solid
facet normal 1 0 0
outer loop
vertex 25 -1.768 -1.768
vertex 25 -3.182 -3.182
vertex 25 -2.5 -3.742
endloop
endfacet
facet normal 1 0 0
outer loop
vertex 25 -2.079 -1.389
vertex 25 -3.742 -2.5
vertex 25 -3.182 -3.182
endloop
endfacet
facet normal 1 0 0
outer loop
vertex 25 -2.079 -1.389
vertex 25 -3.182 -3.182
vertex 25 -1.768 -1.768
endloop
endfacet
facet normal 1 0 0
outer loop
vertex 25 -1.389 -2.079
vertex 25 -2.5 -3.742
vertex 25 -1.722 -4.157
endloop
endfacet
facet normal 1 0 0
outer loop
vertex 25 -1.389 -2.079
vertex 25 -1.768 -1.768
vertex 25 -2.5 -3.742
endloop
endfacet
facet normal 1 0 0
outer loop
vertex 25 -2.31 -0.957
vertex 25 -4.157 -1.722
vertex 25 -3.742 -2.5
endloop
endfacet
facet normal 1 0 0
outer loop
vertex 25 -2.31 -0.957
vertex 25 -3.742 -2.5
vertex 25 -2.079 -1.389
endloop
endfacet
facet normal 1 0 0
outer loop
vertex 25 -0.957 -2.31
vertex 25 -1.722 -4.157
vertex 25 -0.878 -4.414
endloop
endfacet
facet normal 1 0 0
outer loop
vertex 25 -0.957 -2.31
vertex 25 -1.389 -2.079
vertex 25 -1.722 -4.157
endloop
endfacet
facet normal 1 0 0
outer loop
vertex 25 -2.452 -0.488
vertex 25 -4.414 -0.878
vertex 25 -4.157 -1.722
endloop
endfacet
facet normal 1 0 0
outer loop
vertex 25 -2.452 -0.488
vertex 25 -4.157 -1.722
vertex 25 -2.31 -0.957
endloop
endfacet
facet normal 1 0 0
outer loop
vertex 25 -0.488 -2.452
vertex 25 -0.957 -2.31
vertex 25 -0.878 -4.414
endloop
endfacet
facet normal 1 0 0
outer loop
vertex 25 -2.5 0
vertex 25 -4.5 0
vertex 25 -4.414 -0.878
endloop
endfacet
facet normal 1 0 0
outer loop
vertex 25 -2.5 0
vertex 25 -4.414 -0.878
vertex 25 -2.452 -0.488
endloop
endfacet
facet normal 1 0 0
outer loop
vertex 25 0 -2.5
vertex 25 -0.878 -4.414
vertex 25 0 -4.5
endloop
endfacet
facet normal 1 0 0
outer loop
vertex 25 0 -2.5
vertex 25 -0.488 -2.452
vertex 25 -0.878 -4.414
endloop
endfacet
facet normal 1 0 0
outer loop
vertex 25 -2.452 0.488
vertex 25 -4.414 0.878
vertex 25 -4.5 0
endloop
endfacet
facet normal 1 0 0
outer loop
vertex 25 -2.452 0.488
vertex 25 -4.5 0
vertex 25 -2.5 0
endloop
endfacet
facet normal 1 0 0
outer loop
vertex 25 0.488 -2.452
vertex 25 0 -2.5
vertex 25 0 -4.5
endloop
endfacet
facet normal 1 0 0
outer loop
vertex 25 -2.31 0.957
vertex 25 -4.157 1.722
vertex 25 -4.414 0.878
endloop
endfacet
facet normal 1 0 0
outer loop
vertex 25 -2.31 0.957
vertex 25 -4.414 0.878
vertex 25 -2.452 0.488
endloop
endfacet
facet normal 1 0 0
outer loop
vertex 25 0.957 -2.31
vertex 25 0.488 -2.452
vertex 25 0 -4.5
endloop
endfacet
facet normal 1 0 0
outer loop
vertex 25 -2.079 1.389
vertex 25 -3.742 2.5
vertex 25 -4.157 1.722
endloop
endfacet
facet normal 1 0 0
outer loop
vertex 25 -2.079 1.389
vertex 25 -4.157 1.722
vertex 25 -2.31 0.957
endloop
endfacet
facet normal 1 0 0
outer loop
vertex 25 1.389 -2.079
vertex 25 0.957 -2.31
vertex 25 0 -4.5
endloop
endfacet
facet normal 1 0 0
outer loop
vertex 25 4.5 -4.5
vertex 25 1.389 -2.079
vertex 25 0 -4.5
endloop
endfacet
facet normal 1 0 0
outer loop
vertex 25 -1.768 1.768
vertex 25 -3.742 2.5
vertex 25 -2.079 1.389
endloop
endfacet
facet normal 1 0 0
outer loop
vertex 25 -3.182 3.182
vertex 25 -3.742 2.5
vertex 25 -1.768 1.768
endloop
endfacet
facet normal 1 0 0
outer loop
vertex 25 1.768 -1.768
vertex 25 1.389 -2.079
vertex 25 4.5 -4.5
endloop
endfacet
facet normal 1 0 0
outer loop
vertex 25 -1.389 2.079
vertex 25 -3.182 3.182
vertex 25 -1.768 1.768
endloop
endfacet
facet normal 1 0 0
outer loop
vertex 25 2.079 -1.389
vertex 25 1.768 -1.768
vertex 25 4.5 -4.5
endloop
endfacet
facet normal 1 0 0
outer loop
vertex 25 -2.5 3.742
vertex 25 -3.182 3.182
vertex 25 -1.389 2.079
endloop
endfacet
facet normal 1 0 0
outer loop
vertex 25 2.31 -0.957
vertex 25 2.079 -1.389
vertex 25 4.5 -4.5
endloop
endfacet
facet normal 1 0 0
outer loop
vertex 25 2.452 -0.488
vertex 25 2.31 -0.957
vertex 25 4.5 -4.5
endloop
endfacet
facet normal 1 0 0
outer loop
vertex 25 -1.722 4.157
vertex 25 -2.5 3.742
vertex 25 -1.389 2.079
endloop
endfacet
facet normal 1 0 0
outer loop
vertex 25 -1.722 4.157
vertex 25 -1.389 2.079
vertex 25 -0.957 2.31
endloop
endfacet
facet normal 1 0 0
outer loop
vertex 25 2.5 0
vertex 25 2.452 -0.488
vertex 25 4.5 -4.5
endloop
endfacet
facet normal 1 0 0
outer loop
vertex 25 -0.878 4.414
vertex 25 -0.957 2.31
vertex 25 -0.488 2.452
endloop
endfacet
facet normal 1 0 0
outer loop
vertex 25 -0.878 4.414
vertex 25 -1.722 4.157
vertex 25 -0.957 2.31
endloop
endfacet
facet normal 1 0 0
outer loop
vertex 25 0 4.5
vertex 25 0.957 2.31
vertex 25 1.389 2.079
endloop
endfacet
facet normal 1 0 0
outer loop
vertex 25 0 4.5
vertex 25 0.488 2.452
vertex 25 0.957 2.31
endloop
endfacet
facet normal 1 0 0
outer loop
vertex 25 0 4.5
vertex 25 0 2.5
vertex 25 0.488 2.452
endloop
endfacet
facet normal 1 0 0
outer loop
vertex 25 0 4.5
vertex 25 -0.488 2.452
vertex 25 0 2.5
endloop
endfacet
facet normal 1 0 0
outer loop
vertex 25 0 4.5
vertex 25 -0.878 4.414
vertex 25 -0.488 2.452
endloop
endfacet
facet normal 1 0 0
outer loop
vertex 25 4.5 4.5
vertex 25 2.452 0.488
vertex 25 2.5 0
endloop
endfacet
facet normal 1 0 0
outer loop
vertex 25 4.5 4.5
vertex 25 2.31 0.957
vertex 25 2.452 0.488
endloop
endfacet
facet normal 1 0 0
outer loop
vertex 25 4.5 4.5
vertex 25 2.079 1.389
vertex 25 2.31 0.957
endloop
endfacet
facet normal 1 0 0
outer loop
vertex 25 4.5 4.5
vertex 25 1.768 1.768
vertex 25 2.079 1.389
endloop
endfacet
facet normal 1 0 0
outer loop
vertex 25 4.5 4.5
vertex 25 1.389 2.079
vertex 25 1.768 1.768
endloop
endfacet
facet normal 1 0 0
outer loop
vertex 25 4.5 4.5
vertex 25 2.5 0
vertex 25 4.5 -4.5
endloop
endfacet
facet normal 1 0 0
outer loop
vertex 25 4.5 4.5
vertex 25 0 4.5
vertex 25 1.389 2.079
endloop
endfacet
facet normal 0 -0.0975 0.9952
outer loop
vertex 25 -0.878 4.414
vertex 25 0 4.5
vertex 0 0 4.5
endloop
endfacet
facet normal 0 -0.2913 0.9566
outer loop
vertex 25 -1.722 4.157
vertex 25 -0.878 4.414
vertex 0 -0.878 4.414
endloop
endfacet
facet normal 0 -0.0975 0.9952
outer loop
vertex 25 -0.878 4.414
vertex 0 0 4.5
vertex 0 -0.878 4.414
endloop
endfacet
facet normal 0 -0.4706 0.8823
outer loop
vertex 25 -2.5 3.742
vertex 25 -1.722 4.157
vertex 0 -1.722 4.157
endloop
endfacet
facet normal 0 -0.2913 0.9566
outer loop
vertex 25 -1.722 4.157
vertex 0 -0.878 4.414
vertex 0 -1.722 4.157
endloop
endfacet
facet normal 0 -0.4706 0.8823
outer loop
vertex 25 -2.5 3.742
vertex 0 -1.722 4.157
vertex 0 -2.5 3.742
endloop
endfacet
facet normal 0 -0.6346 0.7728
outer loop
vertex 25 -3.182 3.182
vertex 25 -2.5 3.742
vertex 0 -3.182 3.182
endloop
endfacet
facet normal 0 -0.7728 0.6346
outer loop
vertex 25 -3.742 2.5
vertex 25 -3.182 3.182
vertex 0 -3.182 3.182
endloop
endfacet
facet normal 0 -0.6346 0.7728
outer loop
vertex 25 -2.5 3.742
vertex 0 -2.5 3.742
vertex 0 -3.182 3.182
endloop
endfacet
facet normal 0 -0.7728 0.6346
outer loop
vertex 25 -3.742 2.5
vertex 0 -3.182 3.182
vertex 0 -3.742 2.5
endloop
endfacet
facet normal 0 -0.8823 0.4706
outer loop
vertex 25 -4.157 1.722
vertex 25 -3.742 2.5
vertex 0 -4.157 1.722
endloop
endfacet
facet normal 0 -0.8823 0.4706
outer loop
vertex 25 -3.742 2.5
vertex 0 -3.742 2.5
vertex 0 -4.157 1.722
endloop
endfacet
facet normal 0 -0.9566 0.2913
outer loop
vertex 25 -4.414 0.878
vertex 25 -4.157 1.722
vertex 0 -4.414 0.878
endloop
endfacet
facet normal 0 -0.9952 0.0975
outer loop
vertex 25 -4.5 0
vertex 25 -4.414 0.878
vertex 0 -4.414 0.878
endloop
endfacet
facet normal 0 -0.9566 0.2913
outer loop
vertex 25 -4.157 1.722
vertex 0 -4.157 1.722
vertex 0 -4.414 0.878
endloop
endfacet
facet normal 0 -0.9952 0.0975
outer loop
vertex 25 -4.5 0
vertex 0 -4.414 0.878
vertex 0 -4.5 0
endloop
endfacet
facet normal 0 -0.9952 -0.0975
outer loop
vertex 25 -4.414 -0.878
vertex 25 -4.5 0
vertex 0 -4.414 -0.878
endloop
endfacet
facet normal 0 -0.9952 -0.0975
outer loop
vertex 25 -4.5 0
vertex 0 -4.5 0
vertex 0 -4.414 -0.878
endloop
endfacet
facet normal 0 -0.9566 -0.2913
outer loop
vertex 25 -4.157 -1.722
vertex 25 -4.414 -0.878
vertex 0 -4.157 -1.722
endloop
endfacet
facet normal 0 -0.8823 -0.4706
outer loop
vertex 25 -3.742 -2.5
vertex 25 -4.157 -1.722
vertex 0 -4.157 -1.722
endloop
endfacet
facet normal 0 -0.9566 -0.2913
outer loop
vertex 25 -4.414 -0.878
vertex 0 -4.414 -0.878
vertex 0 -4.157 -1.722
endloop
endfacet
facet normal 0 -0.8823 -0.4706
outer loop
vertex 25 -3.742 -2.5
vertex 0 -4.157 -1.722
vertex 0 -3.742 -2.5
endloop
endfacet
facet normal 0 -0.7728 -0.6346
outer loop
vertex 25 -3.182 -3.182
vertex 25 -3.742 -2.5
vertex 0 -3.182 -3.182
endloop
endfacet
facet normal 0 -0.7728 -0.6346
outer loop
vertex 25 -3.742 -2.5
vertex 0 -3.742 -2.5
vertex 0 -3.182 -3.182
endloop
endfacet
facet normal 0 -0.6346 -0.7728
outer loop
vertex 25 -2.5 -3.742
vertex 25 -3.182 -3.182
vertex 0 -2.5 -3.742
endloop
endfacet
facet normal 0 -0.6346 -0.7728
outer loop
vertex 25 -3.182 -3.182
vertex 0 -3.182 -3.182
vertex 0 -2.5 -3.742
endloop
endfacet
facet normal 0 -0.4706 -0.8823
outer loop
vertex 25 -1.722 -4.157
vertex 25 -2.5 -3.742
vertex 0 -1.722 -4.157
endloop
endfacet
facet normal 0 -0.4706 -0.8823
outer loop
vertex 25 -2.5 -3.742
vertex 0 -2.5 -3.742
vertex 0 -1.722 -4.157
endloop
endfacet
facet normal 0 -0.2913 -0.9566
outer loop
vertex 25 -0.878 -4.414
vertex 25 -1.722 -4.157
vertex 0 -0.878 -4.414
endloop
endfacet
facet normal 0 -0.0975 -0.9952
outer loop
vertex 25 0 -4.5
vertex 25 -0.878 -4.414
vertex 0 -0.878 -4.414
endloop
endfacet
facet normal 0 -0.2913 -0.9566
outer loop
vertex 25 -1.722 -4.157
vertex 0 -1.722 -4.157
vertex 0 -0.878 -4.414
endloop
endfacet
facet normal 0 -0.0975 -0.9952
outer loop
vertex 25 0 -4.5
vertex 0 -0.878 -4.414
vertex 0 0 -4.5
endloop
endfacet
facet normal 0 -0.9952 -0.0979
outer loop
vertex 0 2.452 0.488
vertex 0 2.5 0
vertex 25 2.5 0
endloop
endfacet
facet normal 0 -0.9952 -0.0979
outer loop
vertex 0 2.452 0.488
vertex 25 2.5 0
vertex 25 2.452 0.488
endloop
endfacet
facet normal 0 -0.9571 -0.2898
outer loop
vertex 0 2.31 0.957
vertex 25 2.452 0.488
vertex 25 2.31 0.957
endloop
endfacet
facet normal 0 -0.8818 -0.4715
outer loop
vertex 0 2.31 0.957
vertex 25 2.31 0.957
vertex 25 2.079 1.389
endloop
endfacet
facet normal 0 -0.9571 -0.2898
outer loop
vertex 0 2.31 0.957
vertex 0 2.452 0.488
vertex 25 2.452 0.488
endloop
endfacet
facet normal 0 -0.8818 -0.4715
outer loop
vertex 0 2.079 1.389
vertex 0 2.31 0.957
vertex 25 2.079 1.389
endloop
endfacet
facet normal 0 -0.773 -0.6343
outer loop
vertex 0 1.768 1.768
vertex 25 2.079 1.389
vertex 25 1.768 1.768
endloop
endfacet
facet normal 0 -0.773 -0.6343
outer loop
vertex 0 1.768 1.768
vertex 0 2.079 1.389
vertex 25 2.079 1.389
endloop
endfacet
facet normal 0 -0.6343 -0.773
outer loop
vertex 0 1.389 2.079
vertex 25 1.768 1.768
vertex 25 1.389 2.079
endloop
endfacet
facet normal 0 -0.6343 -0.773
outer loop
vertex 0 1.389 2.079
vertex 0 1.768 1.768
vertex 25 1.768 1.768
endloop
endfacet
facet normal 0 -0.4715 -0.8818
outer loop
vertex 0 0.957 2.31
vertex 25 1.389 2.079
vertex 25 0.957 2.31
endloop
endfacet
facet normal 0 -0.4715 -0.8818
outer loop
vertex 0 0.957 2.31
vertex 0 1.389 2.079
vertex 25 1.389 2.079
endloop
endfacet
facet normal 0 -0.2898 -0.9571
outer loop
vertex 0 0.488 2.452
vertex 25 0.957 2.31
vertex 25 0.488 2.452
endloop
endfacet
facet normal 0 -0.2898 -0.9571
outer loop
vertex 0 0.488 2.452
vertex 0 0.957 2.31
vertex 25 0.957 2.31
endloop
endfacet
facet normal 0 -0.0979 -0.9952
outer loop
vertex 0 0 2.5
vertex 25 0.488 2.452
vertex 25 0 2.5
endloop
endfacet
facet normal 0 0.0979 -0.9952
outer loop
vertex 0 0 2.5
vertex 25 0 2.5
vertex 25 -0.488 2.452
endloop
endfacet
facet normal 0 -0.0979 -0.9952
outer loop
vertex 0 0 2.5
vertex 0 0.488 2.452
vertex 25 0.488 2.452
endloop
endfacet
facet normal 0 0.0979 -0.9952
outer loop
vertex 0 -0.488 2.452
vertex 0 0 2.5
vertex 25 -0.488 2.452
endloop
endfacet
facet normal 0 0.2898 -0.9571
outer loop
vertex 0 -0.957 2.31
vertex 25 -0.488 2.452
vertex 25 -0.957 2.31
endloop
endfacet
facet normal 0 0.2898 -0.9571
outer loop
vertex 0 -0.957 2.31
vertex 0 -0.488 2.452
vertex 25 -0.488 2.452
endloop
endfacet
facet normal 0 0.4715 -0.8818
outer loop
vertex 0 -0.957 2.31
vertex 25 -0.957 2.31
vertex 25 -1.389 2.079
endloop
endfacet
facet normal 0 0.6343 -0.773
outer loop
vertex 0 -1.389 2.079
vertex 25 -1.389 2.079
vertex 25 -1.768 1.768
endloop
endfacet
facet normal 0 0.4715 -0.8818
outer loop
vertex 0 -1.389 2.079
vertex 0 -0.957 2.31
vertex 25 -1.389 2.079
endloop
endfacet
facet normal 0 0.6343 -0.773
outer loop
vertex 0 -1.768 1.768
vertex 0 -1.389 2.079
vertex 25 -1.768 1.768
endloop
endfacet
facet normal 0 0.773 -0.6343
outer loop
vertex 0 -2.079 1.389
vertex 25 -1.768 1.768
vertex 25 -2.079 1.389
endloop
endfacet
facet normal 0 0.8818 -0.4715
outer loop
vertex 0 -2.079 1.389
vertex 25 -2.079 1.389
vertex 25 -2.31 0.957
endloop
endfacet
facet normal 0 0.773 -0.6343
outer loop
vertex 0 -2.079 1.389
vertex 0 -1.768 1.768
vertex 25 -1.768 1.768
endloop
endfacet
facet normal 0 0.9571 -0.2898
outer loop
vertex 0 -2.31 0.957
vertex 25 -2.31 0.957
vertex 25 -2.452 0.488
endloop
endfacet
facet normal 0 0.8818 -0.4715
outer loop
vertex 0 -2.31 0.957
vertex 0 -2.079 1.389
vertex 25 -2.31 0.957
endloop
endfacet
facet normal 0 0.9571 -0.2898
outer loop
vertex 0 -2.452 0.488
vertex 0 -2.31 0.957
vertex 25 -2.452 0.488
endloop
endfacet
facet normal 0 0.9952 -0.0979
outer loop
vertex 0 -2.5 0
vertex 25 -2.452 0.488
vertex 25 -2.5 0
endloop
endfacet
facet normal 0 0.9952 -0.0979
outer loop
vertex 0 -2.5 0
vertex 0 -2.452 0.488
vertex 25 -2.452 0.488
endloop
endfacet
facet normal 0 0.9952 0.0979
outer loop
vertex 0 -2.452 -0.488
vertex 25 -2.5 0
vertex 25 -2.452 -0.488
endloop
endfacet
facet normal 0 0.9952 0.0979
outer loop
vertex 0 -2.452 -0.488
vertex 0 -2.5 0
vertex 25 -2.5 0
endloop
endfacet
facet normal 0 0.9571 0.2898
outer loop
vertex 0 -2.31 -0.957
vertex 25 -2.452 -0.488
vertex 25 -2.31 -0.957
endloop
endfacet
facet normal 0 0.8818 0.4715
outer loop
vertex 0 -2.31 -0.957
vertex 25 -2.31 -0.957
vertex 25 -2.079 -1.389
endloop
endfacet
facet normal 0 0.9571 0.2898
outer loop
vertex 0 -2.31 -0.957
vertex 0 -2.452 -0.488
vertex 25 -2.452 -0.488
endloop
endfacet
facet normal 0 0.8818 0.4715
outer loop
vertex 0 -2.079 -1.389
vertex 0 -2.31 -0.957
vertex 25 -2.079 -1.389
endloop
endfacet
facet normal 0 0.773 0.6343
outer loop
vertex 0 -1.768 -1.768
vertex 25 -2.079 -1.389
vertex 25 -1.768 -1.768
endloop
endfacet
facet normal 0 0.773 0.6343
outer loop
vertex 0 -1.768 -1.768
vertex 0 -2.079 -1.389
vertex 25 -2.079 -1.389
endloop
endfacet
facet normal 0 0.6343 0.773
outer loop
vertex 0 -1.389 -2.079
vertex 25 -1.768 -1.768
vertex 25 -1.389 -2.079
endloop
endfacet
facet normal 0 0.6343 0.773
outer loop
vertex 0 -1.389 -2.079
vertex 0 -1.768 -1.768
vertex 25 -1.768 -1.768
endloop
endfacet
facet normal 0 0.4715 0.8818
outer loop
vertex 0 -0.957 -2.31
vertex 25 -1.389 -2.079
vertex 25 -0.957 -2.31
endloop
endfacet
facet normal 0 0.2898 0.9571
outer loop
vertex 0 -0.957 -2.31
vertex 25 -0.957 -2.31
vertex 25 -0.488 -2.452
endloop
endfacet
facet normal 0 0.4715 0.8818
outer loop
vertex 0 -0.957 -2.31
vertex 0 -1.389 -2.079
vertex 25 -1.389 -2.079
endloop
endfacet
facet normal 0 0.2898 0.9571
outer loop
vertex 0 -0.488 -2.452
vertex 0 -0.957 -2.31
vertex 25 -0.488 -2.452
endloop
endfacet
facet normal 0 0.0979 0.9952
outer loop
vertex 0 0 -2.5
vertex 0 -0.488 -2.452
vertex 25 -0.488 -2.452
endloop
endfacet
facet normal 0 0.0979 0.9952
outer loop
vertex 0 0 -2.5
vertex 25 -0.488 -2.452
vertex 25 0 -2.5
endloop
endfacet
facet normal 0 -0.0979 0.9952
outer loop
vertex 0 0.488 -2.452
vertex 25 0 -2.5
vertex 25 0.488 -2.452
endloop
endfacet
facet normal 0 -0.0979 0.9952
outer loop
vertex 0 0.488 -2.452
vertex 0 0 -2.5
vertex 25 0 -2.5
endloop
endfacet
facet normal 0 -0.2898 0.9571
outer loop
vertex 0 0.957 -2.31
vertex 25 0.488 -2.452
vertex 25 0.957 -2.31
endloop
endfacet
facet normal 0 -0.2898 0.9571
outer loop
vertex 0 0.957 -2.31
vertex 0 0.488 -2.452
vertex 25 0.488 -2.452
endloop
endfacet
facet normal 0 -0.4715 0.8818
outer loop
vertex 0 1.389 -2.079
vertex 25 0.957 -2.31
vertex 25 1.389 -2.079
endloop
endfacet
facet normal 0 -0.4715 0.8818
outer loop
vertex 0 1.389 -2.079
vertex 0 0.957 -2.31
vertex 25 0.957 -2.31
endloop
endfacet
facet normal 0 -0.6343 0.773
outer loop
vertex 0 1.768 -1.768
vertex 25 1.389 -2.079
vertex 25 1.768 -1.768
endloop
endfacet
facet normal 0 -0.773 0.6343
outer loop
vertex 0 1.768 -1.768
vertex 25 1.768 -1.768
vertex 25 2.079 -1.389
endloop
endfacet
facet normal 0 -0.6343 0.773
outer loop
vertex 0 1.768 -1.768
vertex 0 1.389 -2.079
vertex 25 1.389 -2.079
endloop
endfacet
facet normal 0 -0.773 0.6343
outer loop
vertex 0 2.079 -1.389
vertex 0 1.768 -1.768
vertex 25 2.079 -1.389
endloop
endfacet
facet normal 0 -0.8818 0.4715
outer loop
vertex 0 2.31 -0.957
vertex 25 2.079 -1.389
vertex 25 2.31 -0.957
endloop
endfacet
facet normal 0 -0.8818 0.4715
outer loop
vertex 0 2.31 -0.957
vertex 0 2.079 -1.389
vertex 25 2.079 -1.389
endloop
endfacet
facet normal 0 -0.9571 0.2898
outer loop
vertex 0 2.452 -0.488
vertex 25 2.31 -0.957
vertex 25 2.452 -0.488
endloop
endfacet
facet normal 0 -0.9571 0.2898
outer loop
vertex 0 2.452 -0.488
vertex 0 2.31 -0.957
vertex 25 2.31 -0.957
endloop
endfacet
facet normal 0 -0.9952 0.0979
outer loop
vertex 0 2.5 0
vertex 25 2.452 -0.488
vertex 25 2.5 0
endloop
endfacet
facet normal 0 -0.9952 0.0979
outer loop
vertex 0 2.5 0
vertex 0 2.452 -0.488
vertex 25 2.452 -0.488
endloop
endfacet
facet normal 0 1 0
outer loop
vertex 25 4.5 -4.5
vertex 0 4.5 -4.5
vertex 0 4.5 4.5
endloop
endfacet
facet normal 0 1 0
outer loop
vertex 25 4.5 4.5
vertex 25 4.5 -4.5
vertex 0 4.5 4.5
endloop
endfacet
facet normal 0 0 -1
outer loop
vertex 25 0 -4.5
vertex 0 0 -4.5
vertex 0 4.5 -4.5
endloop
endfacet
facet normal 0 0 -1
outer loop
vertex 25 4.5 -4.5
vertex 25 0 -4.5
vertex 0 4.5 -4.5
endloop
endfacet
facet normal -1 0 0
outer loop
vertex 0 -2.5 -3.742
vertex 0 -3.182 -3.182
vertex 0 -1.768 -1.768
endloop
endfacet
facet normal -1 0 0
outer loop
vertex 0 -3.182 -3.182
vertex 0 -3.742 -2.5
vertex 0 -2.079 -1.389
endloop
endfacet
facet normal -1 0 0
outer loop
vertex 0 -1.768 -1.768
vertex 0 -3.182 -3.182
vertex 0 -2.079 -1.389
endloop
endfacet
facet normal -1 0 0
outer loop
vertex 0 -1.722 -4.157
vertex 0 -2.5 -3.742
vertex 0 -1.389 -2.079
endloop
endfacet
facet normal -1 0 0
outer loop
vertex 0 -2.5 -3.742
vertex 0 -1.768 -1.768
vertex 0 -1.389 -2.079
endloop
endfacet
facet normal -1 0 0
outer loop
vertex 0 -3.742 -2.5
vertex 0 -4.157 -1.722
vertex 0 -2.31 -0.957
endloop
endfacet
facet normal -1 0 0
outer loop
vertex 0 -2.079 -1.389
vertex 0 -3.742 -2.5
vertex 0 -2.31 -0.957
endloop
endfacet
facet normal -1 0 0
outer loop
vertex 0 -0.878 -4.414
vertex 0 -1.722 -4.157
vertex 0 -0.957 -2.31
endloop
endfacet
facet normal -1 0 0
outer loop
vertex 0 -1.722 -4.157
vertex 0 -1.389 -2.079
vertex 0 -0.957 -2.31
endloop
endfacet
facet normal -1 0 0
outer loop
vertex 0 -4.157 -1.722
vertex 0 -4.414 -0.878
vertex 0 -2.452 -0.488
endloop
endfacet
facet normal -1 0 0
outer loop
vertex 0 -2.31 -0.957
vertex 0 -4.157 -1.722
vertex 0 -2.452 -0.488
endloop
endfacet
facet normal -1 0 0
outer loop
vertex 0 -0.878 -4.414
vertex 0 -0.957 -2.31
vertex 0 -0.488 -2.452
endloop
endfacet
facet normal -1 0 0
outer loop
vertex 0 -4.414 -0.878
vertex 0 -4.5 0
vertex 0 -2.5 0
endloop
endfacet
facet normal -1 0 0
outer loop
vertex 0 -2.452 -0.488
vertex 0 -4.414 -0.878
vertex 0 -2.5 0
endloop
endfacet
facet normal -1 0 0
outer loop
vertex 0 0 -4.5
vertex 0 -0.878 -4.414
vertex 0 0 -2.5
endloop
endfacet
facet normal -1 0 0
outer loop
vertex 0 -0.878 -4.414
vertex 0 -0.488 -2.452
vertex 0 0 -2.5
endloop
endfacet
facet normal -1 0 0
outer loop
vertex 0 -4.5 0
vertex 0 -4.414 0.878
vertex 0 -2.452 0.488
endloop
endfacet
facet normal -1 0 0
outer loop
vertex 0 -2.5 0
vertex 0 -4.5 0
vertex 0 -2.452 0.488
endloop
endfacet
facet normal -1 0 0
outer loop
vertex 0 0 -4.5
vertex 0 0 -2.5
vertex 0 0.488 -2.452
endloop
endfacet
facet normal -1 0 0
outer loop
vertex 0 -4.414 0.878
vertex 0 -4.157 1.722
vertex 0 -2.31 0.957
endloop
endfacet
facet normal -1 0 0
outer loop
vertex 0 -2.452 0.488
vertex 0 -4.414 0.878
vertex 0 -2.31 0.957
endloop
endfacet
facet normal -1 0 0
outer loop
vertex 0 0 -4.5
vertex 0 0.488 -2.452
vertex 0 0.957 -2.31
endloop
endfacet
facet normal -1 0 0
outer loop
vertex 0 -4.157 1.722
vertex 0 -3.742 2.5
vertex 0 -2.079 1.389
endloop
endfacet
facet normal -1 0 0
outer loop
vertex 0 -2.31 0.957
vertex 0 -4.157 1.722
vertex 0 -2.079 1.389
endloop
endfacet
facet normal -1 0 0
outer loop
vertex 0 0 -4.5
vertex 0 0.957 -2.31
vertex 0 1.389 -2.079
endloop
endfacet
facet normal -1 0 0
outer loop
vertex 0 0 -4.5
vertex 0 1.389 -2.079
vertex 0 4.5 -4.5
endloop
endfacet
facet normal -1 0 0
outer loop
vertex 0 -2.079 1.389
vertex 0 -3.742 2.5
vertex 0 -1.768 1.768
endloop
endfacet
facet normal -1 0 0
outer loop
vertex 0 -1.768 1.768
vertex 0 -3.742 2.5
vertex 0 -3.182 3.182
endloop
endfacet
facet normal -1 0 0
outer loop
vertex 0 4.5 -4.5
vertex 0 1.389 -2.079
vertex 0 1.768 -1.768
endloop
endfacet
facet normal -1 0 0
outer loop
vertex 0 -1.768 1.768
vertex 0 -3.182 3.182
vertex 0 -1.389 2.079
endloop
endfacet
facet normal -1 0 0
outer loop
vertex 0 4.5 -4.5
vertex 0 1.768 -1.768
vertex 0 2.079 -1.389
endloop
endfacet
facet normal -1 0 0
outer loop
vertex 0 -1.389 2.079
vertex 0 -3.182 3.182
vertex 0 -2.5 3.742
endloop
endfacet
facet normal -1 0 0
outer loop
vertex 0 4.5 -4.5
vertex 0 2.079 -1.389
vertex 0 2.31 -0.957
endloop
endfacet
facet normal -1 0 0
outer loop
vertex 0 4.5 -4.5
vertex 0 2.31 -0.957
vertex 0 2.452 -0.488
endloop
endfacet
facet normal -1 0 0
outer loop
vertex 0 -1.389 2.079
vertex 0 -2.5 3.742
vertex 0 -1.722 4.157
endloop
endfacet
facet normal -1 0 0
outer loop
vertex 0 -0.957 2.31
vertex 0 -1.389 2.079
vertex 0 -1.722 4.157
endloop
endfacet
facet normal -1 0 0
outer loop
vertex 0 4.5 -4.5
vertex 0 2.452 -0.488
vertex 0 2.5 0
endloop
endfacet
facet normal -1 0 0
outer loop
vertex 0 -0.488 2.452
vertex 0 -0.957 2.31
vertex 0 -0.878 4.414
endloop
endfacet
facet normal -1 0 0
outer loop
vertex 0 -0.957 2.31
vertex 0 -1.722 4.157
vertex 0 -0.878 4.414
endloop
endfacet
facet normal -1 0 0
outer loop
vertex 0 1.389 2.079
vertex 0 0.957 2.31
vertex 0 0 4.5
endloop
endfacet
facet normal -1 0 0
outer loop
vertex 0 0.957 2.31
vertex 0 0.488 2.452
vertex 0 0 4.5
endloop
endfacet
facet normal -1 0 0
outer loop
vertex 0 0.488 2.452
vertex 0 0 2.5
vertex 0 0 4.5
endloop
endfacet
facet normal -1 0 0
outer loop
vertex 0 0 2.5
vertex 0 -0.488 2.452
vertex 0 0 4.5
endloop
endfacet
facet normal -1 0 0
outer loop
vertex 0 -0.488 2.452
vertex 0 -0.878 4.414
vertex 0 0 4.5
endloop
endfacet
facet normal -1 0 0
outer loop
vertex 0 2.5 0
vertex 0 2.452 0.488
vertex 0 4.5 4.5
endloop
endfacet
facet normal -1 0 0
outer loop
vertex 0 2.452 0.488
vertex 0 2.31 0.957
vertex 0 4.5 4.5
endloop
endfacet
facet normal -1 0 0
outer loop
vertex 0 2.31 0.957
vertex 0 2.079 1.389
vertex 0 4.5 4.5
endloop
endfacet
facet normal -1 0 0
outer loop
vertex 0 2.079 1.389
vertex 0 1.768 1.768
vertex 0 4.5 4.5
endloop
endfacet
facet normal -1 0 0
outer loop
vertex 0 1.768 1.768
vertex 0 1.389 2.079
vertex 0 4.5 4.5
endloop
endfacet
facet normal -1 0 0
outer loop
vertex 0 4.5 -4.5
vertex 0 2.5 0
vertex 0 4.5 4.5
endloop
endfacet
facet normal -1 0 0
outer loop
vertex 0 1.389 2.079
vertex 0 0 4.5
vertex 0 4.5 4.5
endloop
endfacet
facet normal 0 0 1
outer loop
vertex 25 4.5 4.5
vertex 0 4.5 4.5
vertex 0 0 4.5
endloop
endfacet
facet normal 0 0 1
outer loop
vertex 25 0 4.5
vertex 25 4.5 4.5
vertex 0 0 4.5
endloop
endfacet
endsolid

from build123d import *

# Parameters (mm, degrees)
F0_R     = 2.5
F1_DEPTH = 25


with BuildPart() as f1:
    # F0 (on Right) → F1 (new body)
    with BuildSketch(Plane.YZ):
        with BuildLine():
            Line((4.5, 4.5), (0, 4.5))
            ThreePointArc((0, 4.5), (-4.5, 0), (0, -4.5))
            Line((0, -4.5), (4.5, -4.5))
            Line((4.5, -4.5), (4.5, 4.5))
        make_face()
        Circle(F0_R, mode=Mode.SUBTRACT)
    extrude(amount=F1_DEPTH)


solid = f1.part
